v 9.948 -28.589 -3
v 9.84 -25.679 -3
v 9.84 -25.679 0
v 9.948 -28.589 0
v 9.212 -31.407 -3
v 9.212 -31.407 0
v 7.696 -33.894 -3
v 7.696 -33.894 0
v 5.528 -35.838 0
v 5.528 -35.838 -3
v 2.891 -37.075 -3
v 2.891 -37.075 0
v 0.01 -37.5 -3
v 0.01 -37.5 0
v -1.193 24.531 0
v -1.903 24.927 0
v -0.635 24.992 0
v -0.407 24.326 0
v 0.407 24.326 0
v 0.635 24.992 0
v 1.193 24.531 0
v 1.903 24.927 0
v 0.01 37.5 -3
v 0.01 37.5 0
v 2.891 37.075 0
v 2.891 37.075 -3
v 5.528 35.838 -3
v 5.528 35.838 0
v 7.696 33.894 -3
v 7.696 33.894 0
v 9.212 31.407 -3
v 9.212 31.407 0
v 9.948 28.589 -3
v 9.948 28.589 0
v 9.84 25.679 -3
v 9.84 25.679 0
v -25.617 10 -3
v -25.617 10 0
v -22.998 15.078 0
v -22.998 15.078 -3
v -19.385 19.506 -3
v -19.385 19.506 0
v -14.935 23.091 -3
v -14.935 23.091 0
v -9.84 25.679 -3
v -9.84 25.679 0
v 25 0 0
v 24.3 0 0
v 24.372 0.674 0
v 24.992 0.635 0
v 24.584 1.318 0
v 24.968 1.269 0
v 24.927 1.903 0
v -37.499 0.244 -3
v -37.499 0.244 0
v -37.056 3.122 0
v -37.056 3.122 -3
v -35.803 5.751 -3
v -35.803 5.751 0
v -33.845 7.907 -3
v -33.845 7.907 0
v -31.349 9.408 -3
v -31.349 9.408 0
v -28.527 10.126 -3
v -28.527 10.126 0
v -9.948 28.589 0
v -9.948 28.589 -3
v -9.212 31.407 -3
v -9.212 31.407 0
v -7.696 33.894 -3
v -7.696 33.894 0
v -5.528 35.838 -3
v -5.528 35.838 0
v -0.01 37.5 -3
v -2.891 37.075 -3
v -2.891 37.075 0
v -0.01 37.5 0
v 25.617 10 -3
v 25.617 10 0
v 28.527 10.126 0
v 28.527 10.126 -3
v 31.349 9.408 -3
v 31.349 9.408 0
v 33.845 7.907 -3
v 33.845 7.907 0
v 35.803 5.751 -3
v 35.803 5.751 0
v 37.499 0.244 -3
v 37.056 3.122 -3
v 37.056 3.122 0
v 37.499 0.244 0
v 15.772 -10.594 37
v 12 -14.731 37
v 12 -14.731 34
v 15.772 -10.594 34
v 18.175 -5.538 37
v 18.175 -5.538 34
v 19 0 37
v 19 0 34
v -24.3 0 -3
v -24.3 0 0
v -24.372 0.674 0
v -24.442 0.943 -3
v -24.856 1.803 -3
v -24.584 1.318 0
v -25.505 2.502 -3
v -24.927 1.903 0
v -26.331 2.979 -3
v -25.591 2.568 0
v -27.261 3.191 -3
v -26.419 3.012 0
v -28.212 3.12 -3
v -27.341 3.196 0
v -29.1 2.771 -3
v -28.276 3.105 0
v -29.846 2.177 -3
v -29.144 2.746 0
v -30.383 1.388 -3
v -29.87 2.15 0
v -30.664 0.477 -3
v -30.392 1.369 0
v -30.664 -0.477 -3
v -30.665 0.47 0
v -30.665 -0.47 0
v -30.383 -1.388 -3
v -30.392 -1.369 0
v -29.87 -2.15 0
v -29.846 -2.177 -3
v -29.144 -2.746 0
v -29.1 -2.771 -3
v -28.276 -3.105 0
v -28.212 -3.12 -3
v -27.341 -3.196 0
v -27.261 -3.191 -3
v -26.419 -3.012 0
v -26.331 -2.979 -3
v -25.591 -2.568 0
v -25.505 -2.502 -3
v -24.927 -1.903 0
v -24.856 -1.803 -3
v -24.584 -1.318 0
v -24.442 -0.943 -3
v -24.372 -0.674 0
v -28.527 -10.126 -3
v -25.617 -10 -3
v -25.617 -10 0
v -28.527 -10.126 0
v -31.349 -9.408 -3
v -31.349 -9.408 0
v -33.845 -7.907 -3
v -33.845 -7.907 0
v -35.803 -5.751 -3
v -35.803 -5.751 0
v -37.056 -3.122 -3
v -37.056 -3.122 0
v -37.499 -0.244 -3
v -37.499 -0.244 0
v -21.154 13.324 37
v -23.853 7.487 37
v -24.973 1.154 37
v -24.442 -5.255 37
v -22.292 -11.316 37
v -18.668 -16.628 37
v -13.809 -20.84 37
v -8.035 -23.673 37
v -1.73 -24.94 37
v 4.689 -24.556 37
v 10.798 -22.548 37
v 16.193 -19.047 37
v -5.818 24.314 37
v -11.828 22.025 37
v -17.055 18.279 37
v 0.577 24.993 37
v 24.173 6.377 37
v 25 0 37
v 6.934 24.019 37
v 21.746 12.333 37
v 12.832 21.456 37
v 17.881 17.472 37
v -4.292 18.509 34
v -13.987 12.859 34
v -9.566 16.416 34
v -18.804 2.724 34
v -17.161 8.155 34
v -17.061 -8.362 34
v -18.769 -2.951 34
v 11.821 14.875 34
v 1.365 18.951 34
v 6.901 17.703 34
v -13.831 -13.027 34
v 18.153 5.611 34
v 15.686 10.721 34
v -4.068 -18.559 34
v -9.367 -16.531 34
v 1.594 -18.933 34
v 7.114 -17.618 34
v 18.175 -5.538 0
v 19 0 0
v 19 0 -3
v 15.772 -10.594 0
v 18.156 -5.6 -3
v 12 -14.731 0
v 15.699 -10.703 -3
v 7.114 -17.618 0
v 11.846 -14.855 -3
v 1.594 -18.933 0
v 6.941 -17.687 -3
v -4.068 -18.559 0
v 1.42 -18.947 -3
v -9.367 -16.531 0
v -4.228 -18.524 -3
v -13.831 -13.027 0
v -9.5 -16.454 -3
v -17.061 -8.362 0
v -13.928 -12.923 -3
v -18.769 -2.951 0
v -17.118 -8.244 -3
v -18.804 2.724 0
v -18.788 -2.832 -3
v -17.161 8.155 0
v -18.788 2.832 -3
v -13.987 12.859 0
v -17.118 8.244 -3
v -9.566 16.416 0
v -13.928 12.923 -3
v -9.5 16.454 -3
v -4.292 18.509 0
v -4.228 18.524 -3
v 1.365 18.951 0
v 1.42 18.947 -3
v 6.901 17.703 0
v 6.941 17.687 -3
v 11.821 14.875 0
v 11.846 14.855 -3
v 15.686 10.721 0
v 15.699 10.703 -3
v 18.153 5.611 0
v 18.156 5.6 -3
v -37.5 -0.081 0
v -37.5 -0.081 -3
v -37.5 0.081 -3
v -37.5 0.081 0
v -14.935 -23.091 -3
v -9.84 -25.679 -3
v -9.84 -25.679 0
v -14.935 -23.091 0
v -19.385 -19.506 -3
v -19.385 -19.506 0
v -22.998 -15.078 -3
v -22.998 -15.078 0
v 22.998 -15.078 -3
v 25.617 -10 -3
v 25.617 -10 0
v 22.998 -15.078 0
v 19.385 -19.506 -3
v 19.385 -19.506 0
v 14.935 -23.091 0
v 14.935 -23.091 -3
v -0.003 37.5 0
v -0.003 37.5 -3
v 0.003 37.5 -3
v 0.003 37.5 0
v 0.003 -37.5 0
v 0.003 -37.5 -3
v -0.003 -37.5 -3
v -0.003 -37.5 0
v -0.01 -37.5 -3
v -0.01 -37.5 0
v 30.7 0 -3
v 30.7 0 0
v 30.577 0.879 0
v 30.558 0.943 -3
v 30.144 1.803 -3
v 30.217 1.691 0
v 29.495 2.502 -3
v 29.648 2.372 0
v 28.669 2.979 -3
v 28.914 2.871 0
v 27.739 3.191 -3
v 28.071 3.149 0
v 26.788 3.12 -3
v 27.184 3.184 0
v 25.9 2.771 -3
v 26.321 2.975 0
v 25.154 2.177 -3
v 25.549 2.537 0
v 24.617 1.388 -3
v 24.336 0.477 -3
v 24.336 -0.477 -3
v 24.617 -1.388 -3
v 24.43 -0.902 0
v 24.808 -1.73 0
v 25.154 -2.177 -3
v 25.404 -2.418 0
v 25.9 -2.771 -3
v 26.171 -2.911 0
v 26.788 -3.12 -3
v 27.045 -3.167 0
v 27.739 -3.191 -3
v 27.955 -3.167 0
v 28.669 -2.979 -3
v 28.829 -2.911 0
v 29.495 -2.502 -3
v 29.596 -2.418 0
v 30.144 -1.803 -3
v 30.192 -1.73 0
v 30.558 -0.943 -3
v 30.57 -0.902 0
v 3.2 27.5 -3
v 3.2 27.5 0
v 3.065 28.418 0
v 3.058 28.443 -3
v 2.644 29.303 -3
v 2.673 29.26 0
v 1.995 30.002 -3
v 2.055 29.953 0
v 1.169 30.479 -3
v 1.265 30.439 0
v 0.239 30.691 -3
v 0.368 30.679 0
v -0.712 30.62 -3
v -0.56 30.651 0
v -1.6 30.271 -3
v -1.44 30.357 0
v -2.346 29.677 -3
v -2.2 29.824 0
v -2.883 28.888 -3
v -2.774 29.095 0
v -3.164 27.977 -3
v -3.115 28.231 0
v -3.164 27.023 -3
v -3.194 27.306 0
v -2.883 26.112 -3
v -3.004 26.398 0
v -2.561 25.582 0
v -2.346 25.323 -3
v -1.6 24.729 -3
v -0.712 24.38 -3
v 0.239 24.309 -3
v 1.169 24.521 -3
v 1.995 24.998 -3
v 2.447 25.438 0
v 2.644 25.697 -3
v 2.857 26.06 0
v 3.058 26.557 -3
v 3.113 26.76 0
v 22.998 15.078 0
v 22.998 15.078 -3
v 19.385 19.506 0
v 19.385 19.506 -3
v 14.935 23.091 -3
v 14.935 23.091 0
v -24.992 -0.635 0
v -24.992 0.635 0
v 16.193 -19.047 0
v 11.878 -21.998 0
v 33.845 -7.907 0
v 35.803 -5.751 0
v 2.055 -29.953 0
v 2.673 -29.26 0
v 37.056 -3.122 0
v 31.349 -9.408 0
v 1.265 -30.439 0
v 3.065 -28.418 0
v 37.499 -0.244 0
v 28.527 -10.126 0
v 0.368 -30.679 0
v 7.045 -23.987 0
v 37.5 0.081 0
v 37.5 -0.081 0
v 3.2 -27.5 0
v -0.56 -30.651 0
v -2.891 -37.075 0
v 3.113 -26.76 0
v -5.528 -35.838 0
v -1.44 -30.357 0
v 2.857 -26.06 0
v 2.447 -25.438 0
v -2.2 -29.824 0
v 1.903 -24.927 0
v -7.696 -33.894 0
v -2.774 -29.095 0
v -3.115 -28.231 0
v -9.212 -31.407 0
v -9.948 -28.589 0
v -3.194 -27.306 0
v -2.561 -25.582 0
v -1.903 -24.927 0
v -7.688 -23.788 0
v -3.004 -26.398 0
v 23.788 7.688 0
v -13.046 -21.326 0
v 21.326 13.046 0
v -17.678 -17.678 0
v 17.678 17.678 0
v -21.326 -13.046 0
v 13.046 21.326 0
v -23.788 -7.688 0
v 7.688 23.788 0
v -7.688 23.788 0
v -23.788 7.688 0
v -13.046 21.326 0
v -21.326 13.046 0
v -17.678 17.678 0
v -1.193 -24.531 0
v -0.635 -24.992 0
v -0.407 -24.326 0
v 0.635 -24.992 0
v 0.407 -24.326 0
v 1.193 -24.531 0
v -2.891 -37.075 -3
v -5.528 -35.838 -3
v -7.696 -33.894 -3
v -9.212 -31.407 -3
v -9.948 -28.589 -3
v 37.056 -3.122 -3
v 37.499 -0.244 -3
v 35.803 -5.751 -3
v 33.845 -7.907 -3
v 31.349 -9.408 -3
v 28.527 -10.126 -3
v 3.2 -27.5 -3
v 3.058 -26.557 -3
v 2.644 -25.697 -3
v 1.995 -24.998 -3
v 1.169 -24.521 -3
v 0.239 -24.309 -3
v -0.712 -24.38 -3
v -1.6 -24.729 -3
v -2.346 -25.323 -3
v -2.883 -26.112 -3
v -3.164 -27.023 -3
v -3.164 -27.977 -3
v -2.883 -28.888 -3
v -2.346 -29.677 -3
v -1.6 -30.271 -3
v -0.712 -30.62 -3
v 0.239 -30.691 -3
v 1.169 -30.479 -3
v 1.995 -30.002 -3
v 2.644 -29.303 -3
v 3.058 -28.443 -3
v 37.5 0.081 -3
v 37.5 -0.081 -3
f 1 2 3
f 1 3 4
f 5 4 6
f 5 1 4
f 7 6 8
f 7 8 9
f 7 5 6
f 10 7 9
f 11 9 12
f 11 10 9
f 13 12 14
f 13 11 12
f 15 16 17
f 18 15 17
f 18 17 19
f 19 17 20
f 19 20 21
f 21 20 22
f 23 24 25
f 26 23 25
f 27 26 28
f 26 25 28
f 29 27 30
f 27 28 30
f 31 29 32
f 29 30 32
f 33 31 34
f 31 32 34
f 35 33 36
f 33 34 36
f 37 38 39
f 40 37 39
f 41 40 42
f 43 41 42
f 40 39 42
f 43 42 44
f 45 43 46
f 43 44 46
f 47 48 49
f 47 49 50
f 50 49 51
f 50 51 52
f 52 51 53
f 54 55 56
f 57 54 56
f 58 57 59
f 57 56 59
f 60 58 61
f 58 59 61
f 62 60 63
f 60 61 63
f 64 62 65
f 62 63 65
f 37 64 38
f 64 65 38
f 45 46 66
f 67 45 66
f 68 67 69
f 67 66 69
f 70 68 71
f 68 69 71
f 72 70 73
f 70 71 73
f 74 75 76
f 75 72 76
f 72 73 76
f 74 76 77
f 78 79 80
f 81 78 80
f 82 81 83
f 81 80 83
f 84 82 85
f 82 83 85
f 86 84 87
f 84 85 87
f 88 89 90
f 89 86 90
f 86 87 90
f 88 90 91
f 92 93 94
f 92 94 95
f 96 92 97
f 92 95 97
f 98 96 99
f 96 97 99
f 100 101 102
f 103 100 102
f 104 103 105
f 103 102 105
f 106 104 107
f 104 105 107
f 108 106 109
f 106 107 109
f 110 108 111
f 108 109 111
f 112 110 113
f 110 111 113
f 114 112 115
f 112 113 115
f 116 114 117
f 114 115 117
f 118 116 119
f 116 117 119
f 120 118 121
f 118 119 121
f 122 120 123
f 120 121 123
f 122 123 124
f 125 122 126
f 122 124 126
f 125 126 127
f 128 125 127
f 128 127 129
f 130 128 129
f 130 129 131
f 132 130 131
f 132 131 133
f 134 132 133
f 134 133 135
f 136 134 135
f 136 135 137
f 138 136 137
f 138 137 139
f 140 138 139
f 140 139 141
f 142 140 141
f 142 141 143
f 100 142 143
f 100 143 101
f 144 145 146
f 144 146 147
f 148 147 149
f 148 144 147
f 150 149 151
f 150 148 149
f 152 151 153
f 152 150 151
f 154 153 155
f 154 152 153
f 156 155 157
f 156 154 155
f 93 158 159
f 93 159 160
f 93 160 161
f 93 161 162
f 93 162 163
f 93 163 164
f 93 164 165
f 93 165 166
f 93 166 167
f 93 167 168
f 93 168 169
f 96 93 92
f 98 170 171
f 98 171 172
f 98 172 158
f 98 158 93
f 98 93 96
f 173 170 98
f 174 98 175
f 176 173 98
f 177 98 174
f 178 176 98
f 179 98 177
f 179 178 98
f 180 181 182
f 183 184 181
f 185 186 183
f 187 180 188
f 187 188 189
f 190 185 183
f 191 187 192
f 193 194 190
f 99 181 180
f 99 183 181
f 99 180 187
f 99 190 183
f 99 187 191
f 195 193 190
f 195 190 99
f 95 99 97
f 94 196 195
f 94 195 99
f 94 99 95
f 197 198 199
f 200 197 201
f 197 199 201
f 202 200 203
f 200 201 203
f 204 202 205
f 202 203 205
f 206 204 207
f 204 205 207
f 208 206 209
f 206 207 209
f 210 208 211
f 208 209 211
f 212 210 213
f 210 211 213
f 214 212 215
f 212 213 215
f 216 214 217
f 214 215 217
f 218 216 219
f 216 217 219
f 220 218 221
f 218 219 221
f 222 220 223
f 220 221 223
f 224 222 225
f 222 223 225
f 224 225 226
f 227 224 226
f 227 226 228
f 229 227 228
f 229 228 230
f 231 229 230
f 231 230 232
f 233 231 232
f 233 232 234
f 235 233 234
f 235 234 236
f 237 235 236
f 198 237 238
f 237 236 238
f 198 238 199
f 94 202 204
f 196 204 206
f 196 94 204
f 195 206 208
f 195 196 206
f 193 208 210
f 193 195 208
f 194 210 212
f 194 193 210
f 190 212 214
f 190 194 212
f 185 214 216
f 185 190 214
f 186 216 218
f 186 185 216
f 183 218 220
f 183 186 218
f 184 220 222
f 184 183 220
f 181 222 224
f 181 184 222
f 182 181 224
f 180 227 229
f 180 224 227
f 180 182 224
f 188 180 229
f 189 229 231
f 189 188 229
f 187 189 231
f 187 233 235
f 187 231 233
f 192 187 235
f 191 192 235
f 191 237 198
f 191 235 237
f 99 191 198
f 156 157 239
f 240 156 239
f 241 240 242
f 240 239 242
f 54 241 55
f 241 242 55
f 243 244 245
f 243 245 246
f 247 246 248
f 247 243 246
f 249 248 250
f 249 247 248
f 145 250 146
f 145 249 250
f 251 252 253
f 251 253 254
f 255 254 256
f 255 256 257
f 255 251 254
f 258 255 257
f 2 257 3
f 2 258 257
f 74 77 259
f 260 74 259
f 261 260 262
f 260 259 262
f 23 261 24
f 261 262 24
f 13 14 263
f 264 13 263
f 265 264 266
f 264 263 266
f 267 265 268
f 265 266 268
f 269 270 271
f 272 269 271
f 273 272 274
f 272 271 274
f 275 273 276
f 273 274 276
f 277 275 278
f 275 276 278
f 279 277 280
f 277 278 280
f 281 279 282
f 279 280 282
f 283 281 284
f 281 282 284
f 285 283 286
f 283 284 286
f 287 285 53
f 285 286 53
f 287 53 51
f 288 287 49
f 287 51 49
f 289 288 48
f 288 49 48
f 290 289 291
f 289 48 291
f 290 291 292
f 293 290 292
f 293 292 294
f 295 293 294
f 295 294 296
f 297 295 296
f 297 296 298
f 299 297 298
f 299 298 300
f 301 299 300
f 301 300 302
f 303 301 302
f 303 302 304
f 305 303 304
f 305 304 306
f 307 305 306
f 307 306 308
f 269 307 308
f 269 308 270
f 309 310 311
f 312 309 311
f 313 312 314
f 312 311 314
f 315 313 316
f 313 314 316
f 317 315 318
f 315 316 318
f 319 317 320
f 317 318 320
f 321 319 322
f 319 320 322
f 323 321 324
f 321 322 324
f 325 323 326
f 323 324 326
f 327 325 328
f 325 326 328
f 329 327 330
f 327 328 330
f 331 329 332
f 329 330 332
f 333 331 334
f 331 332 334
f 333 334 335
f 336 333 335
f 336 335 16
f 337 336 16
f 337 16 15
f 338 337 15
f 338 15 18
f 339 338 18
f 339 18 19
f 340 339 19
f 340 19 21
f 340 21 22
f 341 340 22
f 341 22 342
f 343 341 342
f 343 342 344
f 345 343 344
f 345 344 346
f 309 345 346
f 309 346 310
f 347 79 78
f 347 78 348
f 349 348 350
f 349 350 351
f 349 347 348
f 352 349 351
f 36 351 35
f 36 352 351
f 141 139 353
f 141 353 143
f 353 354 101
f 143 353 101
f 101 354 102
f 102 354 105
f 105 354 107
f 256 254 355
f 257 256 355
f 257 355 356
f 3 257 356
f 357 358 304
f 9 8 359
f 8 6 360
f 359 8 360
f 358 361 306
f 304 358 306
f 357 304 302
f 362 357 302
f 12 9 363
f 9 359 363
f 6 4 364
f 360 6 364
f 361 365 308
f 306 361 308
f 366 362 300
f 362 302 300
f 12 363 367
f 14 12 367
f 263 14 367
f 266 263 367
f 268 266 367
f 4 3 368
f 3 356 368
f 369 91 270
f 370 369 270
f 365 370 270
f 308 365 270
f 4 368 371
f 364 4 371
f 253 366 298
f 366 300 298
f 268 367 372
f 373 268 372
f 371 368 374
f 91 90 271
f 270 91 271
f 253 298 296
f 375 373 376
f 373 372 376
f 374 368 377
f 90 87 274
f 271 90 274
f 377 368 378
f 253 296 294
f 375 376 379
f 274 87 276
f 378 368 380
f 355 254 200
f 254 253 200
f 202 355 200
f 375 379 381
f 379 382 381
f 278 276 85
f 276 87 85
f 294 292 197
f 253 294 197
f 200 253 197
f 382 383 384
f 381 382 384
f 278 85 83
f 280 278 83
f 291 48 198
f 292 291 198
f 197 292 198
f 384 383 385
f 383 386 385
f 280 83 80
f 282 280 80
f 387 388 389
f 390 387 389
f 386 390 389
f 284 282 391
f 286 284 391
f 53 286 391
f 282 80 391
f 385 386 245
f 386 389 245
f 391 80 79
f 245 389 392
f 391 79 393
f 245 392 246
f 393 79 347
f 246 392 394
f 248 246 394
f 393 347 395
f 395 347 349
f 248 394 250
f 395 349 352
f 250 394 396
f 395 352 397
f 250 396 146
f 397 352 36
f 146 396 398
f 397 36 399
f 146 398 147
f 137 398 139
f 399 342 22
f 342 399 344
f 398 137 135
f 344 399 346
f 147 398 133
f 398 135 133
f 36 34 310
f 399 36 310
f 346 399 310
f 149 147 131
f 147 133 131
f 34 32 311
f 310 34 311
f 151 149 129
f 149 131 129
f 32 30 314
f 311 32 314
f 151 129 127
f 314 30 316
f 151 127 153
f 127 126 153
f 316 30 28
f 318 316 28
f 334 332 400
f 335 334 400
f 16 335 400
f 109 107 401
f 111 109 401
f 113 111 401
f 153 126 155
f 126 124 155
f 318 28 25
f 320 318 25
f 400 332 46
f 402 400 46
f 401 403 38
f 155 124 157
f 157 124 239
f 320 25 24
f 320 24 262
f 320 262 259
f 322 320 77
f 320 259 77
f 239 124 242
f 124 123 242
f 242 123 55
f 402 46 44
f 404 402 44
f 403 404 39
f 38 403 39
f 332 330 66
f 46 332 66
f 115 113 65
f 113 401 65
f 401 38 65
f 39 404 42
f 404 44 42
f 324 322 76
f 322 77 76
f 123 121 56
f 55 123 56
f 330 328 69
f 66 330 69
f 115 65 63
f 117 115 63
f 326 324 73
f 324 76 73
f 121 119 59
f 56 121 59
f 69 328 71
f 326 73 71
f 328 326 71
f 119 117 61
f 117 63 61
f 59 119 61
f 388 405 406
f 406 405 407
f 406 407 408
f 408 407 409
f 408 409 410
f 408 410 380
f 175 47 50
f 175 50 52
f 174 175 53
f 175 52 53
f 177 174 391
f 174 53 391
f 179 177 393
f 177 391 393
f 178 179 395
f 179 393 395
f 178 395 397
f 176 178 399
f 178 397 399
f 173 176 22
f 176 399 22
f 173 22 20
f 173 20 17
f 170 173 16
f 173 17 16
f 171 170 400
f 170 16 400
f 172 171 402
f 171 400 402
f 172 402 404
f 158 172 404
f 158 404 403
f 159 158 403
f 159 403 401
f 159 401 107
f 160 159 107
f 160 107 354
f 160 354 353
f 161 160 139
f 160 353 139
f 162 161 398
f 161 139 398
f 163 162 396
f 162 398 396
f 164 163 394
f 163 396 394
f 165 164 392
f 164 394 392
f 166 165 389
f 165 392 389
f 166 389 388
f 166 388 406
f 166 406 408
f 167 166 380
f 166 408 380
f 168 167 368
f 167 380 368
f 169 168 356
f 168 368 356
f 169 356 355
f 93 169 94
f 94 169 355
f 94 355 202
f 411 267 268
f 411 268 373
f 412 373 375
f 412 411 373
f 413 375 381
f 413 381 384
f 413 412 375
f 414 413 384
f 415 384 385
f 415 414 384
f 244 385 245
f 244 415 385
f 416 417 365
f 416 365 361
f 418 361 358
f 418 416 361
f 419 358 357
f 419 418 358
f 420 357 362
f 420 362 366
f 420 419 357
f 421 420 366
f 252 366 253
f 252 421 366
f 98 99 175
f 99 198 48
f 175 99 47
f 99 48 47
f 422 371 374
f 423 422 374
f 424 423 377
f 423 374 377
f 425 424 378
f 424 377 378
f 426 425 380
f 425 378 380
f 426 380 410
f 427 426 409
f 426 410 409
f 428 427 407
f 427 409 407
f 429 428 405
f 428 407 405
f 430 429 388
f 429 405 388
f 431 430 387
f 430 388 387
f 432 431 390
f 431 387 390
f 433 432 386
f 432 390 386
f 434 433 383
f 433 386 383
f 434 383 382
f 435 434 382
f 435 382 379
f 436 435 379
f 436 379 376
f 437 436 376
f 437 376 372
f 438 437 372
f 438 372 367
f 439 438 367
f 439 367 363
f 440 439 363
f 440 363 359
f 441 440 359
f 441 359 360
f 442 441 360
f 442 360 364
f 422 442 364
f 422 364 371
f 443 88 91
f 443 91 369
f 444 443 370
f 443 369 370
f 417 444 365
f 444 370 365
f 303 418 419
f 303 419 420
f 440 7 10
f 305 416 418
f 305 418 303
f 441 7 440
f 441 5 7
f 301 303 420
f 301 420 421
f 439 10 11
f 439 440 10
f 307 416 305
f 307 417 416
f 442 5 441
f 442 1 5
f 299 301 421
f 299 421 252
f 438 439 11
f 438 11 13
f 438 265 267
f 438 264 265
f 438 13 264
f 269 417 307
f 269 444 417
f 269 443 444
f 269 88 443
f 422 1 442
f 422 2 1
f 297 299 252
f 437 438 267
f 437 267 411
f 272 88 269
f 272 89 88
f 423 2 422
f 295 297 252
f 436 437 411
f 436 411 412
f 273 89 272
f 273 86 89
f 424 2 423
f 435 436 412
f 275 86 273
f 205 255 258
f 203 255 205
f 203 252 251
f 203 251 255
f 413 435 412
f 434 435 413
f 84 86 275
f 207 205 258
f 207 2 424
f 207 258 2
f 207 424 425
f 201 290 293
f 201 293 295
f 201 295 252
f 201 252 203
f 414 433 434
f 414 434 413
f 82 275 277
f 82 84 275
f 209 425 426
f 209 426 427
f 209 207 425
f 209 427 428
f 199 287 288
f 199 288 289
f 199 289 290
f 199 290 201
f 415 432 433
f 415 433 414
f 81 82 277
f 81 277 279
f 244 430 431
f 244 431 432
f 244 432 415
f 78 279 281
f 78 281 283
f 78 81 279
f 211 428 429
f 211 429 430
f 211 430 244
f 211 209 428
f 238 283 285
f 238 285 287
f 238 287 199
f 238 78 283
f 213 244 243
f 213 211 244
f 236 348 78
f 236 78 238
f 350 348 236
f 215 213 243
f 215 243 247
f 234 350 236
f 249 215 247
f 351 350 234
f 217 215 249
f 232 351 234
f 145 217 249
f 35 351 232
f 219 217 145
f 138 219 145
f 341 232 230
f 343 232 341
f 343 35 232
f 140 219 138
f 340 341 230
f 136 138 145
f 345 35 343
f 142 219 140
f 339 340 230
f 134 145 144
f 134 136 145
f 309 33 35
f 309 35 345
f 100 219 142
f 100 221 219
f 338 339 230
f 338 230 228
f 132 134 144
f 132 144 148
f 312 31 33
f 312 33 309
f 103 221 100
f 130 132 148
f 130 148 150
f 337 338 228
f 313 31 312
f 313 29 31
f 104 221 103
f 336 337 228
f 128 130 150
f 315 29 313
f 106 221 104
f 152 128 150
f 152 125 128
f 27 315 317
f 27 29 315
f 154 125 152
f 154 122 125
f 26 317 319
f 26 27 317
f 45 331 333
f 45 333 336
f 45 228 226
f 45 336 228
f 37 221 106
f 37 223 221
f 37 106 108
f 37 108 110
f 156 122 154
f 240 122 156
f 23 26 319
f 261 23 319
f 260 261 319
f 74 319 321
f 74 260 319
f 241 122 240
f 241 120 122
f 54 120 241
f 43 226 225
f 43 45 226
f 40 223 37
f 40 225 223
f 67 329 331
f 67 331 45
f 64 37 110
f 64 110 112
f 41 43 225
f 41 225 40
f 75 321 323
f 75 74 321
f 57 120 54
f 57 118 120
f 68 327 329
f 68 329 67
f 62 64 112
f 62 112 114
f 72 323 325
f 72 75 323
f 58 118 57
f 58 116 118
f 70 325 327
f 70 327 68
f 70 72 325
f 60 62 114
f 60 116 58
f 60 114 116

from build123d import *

# Parameters (mm, degrees)
ESQUISSE1_R                  = 25
BOSS_EXTRU_1_DEPTH           = 37
ENL_V_MAT_EXTRU_1_DEPTH      = 3
ENL_V_MAT_EXTRU_1_DEPTH_BACK = 34
ESQUISSE4_R                  = 19
ENL_V_MAT_EXTRU_3_DEPTH      = 52.176166328
ESQUISSE9_R                  = 37.5
BOSS_EXTRU_2_DEPTH           = 3
ENL_V_START                  = 3
ESQUISSE4_2_R                = 19
ENL_V_MAT_EXTRU_4_DEPTH      = 3
D_GAGEMENT_M61_D             = 6.4
D_GAGEMENT_M61_DEPTH         = 3
ENL_V_START_2                = -3
ENL_V_MAT_EXTRU_5_DEPTH      = 3
CONG_1_R                     = 10
CONG_1_OF_SYM_TRIE4_R        = 10
SYM_TRIE5_START              = -3
SYM_TRIE5_DEPTH              = 3


# Read off the part's stored shape, not the designer's step: Symétrie5
with BuildPart() as part:
    # Esquisse1 → Boss.-Extru.1 (new body)
    with BuildSketch(Plane.XY):
        Circle(ESQUISSE1_R)
    extrude(amount=BOSS_EXTRU_1_DEPTH)

    # Esquisse4 → Enlèv. mat.-Extru.1 (cut, two sides: drawn at the far end of the back side and taken through both)
    with BuildSketch(Plane(origin=(0, 0, 0), x_dir=(-1, 0, 0), z_dir=(0, 0, -1)).offset(-ENL_V_MAT_EXTRU_1_DEPTH_BACK)):
        with Locations(Location((0, 0, 0), (0, 0, 180))):
            Circle(ESQUISSE4_R)
    extrude(amount=ENL_V_MAT_EXTRU_1_DEPTH + ENL_V_MAT_EXTRU_1_DEPTH_BACK, mode=Mode.SUBTRACT)

    # Esquisse7 → Enlèv. mat.-Extru.3 (cut, through all)
    with BuildSketch(Plane(origin=(0, 0, 0), x_dir=(-1, 0, 0), z_dir=(0, 0, -1))):
        with BuildLine():
            Line((-16.192810305, -19.047122996), (-11.999578126, -14.731263517))
            ThreePointArc((-11.999578126, -14.731263517), (-17.160885531, -8.154998946), (-19, 0))
            Line((-19, 0), (-25, 0))
            ThreePointArc((-25, 0), (-22.69163125, -10.492372048), (-16.192810305, -19.047122996))
        make_face()
    extrude(amount=-ENL_V_MAT_EXTRU_3_DEPTH, mode=Mode.SUBTRACT)

    # Esquisse9 → Boss.-Extru.2 (add)
    with BuildSketch(Plane(origin=(0, 0, 0), x_dir=(-1, 0, 0), z_dir=(0, 0, -1))):
        Circle(ESQUISSE9_R)
    extrude(amount=BOSS_EXTRU_2_DEPTH)

    # Esquisse4<2> → Enlèv. mat.-Extru.4 (cut)
    with BuildSketch(Plane(origin=(0, 0, 0), x_dir=(-1, 0, 0), z_dir=(0, 0, -1)).offset(ENL_V_START)):
        with Locations(Location((0, 0, 0), (0, 0, 180))):
            Circle(ESQUISSE4_2_R)
    extrude(amount=-ENL_V_MAT_EXTRU_4_DEPTH, mode=Mode.SUBTRACT)

    # Dégagement M61
    with Locations(Plane(origin=(0, 0, -3), x_dir=(-1, 0, 0), z_dir=(0, 0, -1))):
        with Locations((0, 27.5), (27.5, 0), (0, -27.5), (-27.5, 0)):
            Hole(D_GAGEMENT_M61_D / 2, depth=D_GAGEMENT_M61_DEPTH)

    # Esquisse15 → Enlèv. mat.-Extru.5 (cut)
    with BuildSketch(Plane(origin=(0, 0, -3), x_dir=(-1, 0, 0), z_dir=(0, 0, -1)).offset(ENL_V_START_2)):
        with BuildLine():
            Line((34.932786702, 13.636363636), (25.617376915, 10))
            ThreePointArc((25.617376915, 10), (19.384796538, 19.505887911), (9.840281362, 25.679152297))
            Line((9.840281362, 25.679152297), (12.051640076, 35.51067405))
            ThreePointArc((12.051640076, 35.51067405), (25.913422274, 27.106171734), (34.932786702, 13.636363636))
        make_face()
    enl_v_mat_extru_5 = extrude(amount=ENL_V_MAT_EXTRU_5_DEPTH, mode=Mode.SUBTRACT)

    # Congé1
    # the kernel refuses this fillet: 10 mm, written as the material it takes off along each edge
    with BuildSketch(Plane(origin=(-12.051640076, 35.51067405, 30.511737931), x_dir=(0.9866266204606564, 0.16299666192405335, 0), z_dir=(0, 0, -1))) as cong_1_piece_1:
        with BuildLine():
            CenterArc((10.577402483, 9.866707582), CONG_1_R, 178.889666711, 100.475681696)
            Line((0.579280147, 10.060485169), (0.3793177, 10.064360721))
            ThreePointArc((0.3793177, 10.064360721), (0.089970794, 5.04173949), (-0.199669279, 0.011496906))
            Line((-0.199669279, 0.011496906), (-0.032545854, -0.197334152))
            ThreePointArc((-0.032545854, -0.197334152), (6.102347586, -0.699846569), (12.237241026, -0.197334152))
            Line((12.237241026, -0.197334152), (12.204695172, 0))
        make_face()
    extrude(amount=64.023475862, mode=Mode.SUBTRACT)
    with BuildSketch(Plane(origin=(-34.932786702, 13.636363636, 34.090909091), x_dir=(-0.18820424606330075, -0.9821299108385533, 0), z_dir=(0, 0, -1))) as cong_1_piece_2:
        with BuildLine():
            CenterArc((11.818181818, -9.83332166), CONG_1_R, 79.524318304, 100.475681696)
            Line((1.818181818, -9.83332166), (1.618181818, -9.83332166))
            ThreePointArc((1.618181818, -9.83332166), (0.712424476, -4.953024467), (-0.196666433, -0.036363636))
            Line((-0.196666433, -0.036363636), (-0.036363636, 0.196666433))
            ThreePointArc((-0.036363636, 0.196666433), (6.818181818, 0.825043774), (13.672727273, 0.196666433))
            Line((13.672727273, 0.196666433), (13.636363636, 0))
        make_face()
    extrude(amount=71.181818182, mode=Mode.SUBTRACT)

    # Symétrie4: Enlèv. mat.-Extru.5 across plane
    add(enl_v_mat_extru_5.mirror(Plane(origin=(0, 0, 0), x_dir=(0, 0, 1), z_dir=(1, 0, 0))), mode=Mode.SUBTRACT)

    # Congé1 of Symétrie4
    # the kernel refuses this fillet: 10 mm, written as the material it takes off along each edge
    with BuildSketch(Plane(origin=(12.051640076, 35.51067405, 30.511737931), x_dir=(-0.9866266204606562, 0.1629966619240532, 0), z_dir=(0, 0, -1))) as cong_1_of_sym_trie4_piece_1:
        with BuildLine():
            CenterArc((10.577402483, -9.866707582), CONG_1_OF_SYM_TRIE4_R, 80.634651593, 100.475681696)
            Line((0.579280147, -10.060485169), (0.3793177, -10.064360721))
            ThreePointArc((0.3793177, -10.064360721), (0.089970794, -5.04173949), (-0.199669279, -0.011496906))
            Line((-0.199669279, -0.011496906), (-0.032545854, 0.197334152))
            ThreePointArc((-0.032545854, 0.197334152), (6.102347586, 0.699846569), (12.237241026, 0.197334152))
            Line((12.237241026, 0.197334152), (12.204695172, 0))
        make_face()
    extrude(amount=64.023475862, mode=Mode.SUBTRACT)
    with BuildSketch(Plane(origin=(34.932786702, 13.636363636, 34.090909091), x_dir=(0.18820424606330144, -0.982129910838553, 0), z_dir=(0, 0, -1))) as cong_1_of_sym_trie4_piece_2:
        with BuildLine():
            CenterArc((11.818181818, 9.83332166), CONG_1_OF_SYM_TRIE4_R, 180, 100.475681696)
            Line((1.818181818, 9.83332166), (1.618181818, 9.83332166))
            ThreePointArc((1.618181818, 9.83332166), (0.712424476, 4.953024467), (-0.196666433, 0.036363636))
            Line((-0.196666433, 0.036363636), (-0.036363636, -0.196666433))
            ThreePointArc((-0.036363636, -0.196666433), (6.818181818, -0.825043774), (13.672727273, -0.196666433))
            Line((13.672727273, -0.196666433), (13.636363636, 0))
        make_face()
    extrude(amount=71.181818182, mode=Mode.SUBTRACT)

    # Symétrie5 outline → Symétrie5 (cut)
    with BuildSketch(Plane.XY.offset(SYM_TRIE5_START)):
        with BuildLine():
            ThreePointArc((-0.010162924, -37.499998623), (-7.696247071, -33.893936965), (-9.840281362, -25.679152297))
            ThreePointArc((-9.840281362, -25.679152297), (-19.384796538, -19.505887911), (-25.617376915, -10))
            ThreePointArc((-25.617376915, -10), (-33.845353653, -7.907162456), (-37.499208239, -0.243683034))
            ThreePointArc((-37.499208239, -0.243683034), (-26.433813461, -26.59893806), (-0.010162924, -37.499998623))
        make_face()
        with BuildLine():
            ThreePointArc((9.840281362, -25.679152297), (7.696247071, -33.893936965), (0.010162924, -37.499998623))
            ThreePointArc((0.010162924, -37.499998623), (26.433813461, -26.59893806), (37.499208239, -0.243683034))
            ThreePointArc((37.499208239, -0.243683034), (33.845353653, -7.907162456), (25.617376915, -10))
            ThreePointArc((25.617376915, -10), (19.384796538, -19.505887911), (9.840281362, -25.679152297))
        make_face()
    extrude(amount=SYM_TRIE5_DEPTH, mode=Mode.SUBTRACT)


solid = part.part
